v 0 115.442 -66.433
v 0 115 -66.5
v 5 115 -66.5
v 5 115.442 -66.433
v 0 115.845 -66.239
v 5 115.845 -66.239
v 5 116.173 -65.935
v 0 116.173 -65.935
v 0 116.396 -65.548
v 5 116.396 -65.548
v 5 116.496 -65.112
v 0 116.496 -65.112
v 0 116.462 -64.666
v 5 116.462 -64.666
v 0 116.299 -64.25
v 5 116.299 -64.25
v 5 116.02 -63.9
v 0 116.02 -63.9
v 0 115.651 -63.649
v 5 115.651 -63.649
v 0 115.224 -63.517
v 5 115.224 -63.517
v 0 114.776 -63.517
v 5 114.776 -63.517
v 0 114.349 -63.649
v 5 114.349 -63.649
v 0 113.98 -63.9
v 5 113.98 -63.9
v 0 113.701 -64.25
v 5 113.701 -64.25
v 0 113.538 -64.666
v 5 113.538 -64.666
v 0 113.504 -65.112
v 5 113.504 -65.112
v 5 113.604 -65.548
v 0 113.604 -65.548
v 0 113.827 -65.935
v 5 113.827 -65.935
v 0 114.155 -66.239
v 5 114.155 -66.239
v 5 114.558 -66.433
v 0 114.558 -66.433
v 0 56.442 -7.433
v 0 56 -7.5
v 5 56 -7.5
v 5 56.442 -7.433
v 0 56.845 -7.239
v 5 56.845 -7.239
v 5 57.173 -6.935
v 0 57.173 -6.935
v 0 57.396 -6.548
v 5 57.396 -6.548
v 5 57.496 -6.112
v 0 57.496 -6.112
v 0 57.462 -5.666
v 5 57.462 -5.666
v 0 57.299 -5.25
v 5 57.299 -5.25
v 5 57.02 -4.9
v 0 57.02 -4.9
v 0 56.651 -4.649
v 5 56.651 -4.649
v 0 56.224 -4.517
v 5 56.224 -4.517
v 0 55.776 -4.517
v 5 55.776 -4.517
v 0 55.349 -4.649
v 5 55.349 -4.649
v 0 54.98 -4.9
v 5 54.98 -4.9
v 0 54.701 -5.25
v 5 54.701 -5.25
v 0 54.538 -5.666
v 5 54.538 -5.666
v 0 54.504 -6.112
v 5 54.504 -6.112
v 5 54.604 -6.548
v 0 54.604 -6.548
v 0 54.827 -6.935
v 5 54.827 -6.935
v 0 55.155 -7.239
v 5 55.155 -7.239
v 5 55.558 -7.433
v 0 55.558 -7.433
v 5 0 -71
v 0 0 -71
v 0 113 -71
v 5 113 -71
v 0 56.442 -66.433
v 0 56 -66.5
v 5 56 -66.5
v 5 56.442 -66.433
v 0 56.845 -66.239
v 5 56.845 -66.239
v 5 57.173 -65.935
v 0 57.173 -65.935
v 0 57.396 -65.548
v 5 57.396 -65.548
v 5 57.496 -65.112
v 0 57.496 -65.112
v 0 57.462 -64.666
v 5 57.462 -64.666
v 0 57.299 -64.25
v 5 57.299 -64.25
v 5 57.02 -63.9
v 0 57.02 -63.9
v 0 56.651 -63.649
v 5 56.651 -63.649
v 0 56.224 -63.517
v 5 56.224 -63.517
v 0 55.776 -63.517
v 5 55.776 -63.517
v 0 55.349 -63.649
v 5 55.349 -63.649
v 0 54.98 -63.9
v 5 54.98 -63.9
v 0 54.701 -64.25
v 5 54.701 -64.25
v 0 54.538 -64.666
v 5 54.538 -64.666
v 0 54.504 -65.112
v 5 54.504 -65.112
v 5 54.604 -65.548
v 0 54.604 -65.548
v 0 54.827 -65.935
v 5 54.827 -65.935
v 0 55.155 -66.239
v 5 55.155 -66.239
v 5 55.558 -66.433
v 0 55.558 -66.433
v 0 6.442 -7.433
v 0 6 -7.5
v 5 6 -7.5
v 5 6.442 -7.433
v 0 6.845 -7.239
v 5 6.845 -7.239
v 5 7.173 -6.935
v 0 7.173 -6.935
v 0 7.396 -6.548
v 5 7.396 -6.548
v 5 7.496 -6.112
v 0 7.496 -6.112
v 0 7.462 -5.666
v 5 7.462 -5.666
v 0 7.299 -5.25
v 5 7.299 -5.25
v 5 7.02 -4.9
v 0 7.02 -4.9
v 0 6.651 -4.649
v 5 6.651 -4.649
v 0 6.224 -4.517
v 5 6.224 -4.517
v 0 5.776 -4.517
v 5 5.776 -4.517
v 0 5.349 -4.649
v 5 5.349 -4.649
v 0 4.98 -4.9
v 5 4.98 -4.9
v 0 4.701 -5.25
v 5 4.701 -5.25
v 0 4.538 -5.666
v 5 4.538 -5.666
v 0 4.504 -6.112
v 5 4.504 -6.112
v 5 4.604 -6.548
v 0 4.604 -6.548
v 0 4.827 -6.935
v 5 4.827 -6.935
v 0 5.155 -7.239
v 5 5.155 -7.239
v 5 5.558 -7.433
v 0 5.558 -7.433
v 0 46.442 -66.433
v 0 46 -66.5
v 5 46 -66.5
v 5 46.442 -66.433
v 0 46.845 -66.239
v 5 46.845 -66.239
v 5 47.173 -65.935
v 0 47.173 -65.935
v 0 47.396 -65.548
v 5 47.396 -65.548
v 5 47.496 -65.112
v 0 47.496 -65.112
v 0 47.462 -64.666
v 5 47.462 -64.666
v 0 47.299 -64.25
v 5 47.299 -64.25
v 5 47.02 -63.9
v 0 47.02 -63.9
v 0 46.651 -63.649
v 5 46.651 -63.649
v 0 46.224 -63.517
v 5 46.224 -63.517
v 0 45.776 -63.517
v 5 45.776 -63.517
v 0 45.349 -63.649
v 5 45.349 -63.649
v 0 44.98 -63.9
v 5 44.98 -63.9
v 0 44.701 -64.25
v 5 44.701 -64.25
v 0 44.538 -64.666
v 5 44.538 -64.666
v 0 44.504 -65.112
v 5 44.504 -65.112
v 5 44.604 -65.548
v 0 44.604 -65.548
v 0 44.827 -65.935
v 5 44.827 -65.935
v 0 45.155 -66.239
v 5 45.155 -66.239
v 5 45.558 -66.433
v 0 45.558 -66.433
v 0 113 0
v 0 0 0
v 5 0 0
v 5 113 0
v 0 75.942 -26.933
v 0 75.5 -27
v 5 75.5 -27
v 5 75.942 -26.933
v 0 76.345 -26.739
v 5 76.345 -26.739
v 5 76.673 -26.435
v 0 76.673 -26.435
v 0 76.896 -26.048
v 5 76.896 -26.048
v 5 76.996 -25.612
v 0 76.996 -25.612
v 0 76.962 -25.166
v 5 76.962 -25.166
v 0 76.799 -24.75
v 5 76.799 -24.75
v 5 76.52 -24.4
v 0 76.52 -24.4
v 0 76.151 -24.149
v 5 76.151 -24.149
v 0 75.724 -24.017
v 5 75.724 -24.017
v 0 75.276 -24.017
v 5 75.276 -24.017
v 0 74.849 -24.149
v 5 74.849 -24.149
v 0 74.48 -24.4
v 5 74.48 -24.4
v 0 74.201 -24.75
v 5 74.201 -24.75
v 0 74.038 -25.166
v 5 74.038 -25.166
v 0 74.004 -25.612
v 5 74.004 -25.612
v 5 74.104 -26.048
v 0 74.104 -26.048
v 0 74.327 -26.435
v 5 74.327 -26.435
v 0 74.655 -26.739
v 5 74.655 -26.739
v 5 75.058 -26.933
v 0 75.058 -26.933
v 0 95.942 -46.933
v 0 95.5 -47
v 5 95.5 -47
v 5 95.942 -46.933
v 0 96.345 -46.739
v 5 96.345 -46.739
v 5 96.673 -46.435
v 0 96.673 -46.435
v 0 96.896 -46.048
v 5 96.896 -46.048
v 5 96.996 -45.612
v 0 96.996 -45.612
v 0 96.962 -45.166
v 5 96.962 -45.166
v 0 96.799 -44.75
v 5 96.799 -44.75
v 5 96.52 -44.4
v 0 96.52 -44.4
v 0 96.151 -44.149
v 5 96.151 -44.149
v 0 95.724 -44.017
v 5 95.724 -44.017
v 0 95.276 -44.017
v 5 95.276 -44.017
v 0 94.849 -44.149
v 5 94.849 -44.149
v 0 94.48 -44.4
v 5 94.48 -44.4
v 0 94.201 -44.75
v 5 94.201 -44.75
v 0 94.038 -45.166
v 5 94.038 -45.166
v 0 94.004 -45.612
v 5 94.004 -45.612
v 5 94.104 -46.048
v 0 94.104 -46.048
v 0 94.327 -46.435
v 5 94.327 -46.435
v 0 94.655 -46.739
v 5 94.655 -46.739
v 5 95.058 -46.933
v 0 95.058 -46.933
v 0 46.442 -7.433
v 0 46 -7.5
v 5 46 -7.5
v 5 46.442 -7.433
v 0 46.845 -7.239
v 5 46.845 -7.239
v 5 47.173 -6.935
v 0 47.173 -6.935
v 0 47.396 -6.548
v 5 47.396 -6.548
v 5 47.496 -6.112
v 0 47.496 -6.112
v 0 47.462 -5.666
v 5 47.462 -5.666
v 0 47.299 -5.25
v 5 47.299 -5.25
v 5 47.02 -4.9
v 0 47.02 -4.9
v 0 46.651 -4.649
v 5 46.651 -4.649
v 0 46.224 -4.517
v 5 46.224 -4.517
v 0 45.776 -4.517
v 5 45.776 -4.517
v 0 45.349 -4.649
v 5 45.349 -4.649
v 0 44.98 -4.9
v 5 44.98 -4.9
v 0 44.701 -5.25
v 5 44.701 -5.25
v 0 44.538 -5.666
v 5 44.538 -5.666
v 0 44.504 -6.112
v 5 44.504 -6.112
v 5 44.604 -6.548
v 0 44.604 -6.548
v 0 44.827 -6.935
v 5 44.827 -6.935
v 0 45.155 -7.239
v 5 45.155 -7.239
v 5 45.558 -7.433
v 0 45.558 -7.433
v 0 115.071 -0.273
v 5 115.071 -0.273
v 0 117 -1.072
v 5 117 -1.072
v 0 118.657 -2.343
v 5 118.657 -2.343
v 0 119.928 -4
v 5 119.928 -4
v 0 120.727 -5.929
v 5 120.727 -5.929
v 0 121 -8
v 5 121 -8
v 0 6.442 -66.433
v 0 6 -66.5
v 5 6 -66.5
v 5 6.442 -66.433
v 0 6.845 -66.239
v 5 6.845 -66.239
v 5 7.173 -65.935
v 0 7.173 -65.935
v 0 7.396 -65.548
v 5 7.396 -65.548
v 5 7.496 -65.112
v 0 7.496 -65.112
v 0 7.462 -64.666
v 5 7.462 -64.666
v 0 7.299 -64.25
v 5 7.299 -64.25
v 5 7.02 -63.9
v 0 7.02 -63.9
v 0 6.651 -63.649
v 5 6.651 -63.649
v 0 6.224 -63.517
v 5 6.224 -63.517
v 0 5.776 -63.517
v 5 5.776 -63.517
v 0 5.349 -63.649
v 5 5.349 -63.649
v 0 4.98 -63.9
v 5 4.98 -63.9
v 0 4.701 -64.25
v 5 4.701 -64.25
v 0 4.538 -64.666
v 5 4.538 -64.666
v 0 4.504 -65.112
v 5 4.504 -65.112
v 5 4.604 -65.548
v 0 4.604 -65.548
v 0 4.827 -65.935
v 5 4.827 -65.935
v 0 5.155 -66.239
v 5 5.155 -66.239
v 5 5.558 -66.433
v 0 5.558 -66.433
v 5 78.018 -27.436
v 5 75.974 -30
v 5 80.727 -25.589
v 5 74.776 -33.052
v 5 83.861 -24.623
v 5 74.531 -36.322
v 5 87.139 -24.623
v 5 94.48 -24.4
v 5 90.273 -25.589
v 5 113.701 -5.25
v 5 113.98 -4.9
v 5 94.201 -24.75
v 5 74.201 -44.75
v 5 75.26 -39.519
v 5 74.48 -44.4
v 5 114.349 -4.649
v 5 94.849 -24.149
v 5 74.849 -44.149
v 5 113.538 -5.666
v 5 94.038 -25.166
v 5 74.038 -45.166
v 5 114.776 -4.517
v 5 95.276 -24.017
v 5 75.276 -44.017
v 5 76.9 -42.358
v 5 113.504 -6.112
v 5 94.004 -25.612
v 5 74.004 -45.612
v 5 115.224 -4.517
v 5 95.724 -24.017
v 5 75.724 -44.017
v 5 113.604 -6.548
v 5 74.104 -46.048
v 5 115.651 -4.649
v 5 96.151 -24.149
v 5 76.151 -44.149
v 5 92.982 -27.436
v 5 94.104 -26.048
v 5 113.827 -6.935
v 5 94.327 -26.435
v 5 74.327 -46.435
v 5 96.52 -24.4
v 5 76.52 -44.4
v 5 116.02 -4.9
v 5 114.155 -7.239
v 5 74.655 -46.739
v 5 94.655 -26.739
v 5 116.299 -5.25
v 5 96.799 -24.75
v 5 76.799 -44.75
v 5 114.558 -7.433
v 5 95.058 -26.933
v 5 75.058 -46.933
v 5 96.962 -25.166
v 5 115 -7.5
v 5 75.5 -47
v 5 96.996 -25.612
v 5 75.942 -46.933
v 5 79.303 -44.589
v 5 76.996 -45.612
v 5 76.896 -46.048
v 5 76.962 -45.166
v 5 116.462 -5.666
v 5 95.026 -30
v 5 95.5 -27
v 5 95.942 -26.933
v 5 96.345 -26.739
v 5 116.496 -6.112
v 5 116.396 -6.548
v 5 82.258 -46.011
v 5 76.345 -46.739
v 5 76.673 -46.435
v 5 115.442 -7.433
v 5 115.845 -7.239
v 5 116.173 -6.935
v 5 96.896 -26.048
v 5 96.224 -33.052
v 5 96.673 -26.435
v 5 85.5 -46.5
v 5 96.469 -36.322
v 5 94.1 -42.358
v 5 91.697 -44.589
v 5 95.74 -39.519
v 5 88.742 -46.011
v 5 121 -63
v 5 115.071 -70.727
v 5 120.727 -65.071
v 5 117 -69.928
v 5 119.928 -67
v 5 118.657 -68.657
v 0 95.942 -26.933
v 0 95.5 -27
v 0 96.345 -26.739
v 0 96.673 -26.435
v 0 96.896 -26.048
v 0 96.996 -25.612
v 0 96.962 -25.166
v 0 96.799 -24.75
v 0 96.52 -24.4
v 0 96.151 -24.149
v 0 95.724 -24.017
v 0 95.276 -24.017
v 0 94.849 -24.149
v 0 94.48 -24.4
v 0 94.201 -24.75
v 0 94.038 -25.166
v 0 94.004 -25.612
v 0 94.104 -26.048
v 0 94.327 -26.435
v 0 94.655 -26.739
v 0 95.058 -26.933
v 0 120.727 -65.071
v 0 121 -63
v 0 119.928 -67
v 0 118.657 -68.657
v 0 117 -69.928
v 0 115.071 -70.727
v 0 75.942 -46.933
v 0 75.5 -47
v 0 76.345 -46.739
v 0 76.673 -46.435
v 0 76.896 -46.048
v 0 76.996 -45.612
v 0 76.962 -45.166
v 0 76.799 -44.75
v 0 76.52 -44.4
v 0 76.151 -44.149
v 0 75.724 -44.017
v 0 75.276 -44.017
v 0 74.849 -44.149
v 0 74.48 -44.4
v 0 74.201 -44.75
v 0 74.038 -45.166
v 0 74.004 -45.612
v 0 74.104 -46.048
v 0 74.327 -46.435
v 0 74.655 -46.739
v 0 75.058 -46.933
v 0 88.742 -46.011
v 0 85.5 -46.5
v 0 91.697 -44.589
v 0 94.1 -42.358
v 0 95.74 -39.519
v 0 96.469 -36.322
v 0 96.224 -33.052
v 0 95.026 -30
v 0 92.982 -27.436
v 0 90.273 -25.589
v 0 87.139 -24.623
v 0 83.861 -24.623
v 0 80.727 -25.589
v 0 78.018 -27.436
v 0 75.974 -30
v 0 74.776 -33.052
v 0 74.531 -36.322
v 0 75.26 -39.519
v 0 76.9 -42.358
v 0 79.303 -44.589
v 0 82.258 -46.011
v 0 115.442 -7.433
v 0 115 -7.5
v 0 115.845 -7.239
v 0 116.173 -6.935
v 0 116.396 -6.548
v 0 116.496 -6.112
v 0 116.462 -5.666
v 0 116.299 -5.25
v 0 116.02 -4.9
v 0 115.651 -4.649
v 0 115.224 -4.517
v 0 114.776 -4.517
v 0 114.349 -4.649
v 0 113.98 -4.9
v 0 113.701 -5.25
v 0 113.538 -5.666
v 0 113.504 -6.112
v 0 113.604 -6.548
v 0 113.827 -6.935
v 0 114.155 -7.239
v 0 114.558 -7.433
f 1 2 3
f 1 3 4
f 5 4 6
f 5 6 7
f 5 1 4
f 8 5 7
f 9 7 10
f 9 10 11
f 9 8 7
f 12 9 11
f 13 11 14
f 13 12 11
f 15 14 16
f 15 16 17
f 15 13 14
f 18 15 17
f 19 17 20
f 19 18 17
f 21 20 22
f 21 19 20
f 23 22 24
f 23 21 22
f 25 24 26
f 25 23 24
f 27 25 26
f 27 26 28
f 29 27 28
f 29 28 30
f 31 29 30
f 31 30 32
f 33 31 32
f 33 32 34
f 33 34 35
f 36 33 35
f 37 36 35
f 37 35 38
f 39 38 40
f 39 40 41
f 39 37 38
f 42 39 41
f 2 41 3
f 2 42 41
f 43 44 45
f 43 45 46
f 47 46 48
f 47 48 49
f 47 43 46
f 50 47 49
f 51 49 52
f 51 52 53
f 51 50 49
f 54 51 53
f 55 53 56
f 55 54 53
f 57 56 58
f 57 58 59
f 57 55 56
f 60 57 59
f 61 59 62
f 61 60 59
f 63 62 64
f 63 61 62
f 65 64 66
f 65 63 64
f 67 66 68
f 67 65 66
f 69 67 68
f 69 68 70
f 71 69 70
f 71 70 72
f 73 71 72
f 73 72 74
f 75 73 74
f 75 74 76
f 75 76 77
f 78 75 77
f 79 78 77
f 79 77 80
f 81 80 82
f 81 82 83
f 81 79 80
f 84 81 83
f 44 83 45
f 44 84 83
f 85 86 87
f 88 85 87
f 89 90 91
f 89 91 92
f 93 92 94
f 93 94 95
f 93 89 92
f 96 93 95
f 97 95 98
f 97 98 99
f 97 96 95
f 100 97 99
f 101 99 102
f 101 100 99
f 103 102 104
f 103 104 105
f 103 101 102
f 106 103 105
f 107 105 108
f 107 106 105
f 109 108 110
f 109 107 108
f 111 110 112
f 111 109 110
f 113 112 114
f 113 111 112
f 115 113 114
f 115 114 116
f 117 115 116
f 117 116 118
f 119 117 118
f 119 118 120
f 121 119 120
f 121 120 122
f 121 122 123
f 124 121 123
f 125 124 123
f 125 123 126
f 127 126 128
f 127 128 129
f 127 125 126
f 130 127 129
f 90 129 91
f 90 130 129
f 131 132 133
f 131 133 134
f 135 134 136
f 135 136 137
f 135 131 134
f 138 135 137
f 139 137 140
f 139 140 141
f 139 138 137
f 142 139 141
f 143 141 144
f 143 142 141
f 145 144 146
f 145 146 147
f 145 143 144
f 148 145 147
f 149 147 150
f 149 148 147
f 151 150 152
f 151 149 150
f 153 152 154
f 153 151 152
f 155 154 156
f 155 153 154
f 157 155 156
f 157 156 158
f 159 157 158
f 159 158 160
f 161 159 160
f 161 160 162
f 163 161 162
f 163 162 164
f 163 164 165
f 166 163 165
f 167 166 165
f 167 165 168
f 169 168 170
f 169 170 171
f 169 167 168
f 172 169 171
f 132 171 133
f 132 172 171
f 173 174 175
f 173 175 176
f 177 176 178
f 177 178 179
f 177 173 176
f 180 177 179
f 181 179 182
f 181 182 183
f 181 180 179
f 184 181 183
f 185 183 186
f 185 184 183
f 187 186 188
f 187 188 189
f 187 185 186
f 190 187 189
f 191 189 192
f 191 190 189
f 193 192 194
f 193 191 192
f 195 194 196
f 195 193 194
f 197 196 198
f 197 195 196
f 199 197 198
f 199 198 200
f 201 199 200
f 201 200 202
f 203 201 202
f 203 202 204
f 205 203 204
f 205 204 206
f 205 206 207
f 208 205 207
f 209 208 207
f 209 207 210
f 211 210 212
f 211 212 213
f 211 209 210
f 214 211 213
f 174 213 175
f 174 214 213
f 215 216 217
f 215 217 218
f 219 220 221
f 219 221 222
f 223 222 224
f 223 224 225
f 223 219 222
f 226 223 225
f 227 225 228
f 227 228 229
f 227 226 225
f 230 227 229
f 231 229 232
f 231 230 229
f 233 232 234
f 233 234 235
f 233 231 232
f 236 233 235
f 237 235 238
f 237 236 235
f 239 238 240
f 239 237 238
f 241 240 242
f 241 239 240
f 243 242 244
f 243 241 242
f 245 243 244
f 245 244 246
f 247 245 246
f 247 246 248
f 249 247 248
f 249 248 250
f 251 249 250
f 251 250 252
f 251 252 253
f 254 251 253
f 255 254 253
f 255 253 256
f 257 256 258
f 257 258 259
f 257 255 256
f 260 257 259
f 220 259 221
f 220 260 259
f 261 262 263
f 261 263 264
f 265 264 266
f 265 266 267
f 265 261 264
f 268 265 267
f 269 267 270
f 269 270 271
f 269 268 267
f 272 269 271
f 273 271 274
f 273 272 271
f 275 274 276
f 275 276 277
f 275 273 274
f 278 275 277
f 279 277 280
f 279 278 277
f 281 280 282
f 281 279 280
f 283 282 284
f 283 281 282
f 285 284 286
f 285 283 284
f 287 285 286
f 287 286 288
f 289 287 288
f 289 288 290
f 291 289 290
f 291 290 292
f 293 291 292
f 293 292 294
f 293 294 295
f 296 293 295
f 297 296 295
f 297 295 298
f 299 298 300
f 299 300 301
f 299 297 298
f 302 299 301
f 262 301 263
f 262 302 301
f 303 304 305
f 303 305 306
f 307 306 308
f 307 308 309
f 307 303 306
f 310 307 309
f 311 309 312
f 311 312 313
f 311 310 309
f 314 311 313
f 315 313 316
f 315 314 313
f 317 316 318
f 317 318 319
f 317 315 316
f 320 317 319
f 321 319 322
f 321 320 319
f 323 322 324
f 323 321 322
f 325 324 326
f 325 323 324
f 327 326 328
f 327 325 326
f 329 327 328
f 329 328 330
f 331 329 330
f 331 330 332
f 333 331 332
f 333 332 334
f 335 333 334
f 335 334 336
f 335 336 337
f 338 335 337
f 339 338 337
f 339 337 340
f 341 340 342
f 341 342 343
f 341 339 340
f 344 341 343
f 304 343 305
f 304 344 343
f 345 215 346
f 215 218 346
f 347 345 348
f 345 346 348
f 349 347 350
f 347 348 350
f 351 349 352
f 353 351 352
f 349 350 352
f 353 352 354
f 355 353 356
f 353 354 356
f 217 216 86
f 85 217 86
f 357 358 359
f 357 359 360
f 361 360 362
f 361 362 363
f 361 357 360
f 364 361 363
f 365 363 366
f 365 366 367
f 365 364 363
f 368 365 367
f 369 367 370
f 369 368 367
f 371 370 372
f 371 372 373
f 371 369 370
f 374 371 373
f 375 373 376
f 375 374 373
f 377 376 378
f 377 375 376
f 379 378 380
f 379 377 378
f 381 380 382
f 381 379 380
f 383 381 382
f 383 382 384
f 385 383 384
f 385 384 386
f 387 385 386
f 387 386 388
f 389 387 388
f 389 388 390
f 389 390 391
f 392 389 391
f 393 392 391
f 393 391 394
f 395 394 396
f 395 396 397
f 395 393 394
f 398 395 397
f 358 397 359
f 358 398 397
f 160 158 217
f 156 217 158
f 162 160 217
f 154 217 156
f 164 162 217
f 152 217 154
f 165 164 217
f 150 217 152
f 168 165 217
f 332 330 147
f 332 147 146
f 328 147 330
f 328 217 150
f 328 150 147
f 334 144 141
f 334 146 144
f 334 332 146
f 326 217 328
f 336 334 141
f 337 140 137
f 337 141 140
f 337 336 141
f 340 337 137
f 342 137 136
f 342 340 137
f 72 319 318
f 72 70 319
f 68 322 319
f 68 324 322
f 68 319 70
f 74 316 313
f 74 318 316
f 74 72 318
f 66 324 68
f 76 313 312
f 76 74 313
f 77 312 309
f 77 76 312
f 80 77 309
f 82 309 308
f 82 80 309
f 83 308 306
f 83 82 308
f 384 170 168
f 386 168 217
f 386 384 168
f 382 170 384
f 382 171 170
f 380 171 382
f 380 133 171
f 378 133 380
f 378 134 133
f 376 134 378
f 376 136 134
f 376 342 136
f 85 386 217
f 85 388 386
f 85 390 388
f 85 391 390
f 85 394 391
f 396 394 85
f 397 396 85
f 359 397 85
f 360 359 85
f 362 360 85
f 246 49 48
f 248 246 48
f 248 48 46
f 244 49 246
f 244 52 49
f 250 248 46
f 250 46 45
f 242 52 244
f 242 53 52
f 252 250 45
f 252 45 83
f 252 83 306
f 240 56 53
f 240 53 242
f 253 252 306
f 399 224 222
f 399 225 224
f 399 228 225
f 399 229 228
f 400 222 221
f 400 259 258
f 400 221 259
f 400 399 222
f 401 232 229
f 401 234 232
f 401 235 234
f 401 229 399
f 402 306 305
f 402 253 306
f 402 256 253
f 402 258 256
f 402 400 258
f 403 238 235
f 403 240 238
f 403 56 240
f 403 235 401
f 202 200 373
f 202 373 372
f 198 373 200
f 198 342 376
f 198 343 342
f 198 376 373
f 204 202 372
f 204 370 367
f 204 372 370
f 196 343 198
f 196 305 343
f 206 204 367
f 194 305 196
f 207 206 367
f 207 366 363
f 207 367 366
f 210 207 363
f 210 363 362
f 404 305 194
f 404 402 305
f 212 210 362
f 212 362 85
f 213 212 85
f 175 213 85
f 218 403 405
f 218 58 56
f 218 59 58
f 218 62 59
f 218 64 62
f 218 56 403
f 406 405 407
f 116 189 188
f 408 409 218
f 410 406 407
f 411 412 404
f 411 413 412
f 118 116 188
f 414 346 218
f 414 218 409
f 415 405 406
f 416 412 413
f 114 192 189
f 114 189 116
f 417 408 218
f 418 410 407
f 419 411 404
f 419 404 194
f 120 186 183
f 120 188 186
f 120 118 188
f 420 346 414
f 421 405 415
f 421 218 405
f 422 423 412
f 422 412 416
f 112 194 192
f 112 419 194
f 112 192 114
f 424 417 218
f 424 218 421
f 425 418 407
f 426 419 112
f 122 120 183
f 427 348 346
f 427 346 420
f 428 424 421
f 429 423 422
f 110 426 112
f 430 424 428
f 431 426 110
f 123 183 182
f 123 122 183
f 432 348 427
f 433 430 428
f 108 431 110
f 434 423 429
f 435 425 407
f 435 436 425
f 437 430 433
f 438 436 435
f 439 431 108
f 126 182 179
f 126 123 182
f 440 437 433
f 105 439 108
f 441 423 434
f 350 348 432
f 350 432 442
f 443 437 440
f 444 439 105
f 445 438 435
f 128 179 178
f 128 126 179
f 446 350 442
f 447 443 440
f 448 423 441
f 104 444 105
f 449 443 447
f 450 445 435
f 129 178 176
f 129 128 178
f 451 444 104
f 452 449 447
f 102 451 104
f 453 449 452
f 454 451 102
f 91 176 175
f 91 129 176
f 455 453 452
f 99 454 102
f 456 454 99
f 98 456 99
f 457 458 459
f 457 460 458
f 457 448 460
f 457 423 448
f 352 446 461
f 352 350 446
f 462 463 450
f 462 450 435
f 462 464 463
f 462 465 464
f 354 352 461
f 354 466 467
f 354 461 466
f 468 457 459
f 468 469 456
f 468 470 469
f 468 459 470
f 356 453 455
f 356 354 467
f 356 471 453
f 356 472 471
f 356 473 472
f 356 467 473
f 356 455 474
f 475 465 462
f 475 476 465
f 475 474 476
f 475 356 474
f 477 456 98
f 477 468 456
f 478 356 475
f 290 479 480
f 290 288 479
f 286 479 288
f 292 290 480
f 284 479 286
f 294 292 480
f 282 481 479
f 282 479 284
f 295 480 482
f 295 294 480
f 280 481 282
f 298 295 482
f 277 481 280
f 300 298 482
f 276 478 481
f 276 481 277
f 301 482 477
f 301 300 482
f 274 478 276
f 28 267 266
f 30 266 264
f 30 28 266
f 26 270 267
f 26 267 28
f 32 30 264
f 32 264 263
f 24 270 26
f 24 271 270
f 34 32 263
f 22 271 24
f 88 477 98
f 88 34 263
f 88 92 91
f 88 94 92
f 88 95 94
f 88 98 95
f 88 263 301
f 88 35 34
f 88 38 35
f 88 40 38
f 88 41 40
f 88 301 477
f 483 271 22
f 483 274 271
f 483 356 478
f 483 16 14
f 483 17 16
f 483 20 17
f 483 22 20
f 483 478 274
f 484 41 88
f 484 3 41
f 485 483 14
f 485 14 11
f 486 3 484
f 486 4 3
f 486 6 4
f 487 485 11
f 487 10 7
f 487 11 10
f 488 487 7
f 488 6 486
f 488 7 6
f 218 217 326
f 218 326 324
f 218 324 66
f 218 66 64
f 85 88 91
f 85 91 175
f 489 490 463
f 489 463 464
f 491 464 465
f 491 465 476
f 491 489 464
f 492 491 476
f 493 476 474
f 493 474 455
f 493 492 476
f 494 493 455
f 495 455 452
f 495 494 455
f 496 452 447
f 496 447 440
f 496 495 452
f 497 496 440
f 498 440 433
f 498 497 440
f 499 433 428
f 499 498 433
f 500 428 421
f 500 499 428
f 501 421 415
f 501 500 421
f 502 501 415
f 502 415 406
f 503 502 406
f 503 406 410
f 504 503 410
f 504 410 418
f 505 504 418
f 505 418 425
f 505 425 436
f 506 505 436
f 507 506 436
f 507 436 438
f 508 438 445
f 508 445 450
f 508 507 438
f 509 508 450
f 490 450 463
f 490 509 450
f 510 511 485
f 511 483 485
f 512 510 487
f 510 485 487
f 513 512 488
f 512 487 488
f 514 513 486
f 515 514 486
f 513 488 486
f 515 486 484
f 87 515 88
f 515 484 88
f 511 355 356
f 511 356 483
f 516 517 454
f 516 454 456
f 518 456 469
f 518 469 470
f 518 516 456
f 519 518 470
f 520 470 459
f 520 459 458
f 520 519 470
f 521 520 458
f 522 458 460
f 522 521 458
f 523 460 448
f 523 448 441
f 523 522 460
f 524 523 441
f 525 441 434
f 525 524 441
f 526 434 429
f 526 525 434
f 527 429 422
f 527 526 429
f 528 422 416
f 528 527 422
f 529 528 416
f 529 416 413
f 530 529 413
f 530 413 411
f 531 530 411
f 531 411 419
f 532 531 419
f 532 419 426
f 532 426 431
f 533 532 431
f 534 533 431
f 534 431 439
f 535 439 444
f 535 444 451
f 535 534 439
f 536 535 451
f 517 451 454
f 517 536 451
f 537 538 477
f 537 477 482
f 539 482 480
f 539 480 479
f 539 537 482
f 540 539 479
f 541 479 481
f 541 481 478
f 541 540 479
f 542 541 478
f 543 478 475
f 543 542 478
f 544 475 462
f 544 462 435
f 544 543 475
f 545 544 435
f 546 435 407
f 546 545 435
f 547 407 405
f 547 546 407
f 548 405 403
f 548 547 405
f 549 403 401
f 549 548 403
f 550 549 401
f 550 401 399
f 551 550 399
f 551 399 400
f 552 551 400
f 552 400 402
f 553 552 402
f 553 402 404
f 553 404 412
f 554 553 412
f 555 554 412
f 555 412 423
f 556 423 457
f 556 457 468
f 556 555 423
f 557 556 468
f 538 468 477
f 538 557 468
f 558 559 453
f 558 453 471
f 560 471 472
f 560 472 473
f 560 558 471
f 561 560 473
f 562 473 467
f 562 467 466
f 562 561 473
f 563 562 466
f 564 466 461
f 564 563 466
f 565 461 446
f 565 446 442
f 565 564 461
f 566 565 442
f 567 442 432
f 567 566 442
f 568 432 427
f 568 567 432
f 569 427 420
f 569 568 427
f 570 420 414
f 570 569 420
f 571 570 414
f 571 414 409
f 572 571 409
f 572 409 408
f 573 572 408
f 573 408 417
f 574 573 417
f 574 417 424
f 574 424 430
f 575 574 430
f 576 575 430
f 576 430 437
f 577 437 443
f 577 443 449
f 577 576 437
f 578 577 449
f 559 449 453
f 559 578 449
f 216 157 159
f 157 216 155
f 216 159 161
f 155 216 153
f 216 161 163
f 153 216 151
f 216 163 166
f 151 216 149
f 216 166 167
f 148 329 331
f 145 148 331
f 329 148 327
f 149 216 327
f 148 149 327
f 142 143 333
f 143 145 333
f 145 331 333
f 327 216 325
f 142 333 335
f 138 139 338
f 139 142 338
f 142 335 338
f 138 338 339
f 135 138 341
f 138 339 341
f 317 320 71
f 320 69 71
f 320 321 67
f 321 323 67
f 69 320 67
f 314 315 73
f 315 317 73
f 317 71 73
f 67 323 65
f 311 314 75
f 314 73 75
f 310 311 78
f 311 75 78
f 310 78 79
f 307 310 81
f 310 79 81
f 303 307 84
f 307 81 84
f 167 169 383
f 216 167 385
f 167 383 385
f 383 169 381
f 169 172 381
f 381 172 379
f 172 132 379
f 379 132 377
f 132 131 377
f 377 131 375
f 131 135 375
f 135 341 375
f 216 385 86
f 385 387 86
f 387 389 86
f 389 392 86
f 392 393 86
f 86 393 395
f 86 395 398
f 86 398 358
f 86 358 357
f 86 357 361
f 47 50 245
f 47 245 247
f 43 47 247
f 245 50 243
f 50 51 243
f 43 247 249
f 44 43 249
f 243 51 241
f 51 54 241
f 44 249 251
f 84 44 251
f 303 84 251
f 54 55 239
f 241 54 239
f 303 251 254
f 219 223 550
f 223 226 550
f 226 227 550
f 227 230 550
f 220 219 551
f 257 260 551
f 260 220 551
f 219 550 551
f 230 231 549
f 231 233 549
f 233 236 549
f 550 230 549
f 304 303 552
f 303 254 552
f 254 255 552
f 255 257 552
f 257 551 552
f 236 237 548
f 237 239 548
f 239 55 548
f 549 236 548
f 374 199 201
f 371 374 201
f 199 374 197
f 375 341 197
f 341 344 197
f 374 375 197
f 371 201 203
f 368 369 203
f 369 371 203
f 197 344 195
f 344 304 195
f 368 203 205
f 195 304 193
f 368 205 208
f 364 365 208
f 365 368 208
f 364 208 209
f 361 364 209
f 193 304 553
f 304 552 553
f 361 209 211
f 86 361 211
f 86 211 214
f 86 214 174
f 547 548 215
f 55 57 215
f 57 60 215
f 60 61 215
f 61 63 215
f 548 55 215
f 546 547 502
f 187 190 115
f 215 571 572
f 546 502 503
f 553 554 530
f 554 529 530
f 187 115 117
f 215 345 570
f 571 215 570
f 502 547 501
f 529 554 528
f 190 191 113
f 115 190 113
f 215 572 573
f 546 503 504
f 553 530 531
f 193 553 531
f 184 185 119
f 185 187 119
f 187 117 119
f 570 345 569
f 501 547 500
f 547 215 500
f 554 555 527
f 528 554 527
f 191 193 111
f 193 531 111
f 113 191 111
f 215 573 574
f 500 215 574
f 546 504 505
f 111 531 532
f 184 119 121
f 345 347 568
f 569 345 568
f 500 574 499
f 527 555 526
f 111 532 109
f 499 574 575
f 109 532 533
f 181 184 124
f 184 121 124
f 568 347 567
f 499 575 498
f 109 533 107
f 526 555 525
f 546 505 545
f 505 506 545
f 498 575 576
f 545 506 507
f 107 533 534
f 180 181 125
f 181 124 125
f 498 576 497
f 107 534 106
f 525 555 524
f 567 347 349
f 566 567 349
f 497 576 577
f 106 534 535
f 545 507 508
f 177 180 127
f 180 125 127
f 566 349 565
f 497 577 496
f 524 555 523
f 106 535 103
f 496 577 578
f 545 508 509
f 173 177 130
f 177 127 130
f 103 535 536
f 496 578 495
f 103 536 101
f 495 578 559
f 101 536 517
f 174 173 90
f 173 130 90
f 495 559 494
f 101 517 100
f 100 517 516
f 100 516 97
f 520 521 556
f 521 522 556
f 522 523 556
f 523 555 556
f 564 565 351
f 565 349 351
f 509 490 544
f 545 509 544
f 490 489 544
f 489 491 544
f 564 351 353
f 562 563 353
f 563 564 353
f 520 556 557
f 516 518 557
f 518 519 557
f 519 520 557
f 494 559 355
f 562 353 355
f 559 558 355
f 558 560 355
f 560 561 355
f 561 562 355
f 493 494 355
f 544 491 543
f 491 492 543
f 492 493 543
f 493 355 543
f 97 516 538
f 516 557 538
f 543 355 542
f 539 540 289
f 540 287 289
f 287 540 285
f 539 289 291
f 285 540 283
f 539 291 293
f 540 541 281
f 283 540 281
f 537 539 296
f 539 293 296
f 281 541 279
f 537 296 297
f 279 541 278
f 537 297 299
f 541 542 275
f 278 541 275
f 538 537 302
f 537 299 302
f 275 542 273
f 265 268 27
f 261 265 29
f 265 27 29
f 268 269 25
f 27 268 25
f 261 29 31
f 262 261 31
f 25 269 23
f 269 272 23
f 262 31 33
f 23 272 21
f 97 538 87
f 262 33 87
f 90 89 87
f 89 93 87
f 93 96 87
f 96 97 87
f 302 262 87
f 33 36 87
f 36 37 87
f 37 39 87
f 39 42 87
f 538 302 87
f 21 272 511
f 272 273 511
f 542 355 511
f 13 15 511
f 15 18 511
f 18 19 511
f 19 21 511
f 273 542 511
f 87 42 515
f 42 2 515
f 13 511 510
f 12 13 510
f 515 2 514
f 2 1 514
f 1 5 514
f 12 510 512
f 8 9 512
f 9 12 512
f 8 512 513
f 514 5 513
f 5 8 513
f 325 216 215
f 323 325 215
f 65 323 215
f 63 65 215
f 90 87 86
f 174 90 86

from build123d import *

# Parameters (mm, degrees)
SKETCH1_W           = 71
SKETCH1_H           = 121
SKETCH1_R           = 1.5
SKETCH1_R_2         = 11
BOSS_EXTRUDE1_DEPTH = 5
FILLET1_R           = 8


with BuildPart() as part:
    # Sketch1 → Boss-Extrude1 (new body)
    with BuildSketch(Plane(origin=(0, 0, 0), x_dir=(0, 0, -1), z_dir=(1, 0, 0))):
        with Locations((35.5, 60.5)):
            Rectangle(SKETCH1_W, SKETCH1_H)
        with Locations((6, 115)):
            Circle(SKETCH1_R, mode=Mode.SUBTRACT)
        with Locations((65, 115)):
            Circle(SKETCH1_R, mode=Mode.SUBTRACT)
        with Locations((35.5, 85.5)):
            Circle(SKETCH1_R_2, mode=Mode.SUBTRACT)
        with Locations((25.5, 95.5)):
            Circle(SKETCH1_R, mode=Mode.SUBTRACT)
        with Locations((45.5, 95.5)):
            Circle(SKETCH1_R, mode=Mode.SUBTRACT)
        with Locations((45.5, 75.5)):
            Circle(SKETCH1_R, mode=Mode.SUBTRACT)
        with Locations((25.5, 75.5)):
            Circle(SKETCH1_R, mode=Mode.SUBTRACT)
        with Locations((6, 56)):
            Circle(SKETCH1_R, mode=Mode.SUBTRACT)
        with Locations((65, 56)):
            Circle(SKETCH1_R, mode=Mode.SUBTRACT)
        with Locations((6, 6)):
            Circle(SKETCH1_R, mode=Mode.SUBTRACT)
        with Locations((65, 6)):
            Circle(SKETCH1_R, mode=Mode.SUBTRACT)
        with Locations((6, 46)):
            Circle(SKETCH1_R, mode=Mode.SUBTRACT)
        with Locations((65, 46)):
            Circle(SKETCH1_R, mode=Mode.SUBTRACT)
    extrude(amount=BOSS_EXTRUDE1_DEPTH)

    # Fillet1
    fillet1_edges = [part.edges().sort_by_distance(p)[0] for p in [
        (2.5, 121, 0),
        (2.5, 121, -71),
    ]]
    fillet(fillet1_edges, radius=FILLET1_R)


solid = part.part
